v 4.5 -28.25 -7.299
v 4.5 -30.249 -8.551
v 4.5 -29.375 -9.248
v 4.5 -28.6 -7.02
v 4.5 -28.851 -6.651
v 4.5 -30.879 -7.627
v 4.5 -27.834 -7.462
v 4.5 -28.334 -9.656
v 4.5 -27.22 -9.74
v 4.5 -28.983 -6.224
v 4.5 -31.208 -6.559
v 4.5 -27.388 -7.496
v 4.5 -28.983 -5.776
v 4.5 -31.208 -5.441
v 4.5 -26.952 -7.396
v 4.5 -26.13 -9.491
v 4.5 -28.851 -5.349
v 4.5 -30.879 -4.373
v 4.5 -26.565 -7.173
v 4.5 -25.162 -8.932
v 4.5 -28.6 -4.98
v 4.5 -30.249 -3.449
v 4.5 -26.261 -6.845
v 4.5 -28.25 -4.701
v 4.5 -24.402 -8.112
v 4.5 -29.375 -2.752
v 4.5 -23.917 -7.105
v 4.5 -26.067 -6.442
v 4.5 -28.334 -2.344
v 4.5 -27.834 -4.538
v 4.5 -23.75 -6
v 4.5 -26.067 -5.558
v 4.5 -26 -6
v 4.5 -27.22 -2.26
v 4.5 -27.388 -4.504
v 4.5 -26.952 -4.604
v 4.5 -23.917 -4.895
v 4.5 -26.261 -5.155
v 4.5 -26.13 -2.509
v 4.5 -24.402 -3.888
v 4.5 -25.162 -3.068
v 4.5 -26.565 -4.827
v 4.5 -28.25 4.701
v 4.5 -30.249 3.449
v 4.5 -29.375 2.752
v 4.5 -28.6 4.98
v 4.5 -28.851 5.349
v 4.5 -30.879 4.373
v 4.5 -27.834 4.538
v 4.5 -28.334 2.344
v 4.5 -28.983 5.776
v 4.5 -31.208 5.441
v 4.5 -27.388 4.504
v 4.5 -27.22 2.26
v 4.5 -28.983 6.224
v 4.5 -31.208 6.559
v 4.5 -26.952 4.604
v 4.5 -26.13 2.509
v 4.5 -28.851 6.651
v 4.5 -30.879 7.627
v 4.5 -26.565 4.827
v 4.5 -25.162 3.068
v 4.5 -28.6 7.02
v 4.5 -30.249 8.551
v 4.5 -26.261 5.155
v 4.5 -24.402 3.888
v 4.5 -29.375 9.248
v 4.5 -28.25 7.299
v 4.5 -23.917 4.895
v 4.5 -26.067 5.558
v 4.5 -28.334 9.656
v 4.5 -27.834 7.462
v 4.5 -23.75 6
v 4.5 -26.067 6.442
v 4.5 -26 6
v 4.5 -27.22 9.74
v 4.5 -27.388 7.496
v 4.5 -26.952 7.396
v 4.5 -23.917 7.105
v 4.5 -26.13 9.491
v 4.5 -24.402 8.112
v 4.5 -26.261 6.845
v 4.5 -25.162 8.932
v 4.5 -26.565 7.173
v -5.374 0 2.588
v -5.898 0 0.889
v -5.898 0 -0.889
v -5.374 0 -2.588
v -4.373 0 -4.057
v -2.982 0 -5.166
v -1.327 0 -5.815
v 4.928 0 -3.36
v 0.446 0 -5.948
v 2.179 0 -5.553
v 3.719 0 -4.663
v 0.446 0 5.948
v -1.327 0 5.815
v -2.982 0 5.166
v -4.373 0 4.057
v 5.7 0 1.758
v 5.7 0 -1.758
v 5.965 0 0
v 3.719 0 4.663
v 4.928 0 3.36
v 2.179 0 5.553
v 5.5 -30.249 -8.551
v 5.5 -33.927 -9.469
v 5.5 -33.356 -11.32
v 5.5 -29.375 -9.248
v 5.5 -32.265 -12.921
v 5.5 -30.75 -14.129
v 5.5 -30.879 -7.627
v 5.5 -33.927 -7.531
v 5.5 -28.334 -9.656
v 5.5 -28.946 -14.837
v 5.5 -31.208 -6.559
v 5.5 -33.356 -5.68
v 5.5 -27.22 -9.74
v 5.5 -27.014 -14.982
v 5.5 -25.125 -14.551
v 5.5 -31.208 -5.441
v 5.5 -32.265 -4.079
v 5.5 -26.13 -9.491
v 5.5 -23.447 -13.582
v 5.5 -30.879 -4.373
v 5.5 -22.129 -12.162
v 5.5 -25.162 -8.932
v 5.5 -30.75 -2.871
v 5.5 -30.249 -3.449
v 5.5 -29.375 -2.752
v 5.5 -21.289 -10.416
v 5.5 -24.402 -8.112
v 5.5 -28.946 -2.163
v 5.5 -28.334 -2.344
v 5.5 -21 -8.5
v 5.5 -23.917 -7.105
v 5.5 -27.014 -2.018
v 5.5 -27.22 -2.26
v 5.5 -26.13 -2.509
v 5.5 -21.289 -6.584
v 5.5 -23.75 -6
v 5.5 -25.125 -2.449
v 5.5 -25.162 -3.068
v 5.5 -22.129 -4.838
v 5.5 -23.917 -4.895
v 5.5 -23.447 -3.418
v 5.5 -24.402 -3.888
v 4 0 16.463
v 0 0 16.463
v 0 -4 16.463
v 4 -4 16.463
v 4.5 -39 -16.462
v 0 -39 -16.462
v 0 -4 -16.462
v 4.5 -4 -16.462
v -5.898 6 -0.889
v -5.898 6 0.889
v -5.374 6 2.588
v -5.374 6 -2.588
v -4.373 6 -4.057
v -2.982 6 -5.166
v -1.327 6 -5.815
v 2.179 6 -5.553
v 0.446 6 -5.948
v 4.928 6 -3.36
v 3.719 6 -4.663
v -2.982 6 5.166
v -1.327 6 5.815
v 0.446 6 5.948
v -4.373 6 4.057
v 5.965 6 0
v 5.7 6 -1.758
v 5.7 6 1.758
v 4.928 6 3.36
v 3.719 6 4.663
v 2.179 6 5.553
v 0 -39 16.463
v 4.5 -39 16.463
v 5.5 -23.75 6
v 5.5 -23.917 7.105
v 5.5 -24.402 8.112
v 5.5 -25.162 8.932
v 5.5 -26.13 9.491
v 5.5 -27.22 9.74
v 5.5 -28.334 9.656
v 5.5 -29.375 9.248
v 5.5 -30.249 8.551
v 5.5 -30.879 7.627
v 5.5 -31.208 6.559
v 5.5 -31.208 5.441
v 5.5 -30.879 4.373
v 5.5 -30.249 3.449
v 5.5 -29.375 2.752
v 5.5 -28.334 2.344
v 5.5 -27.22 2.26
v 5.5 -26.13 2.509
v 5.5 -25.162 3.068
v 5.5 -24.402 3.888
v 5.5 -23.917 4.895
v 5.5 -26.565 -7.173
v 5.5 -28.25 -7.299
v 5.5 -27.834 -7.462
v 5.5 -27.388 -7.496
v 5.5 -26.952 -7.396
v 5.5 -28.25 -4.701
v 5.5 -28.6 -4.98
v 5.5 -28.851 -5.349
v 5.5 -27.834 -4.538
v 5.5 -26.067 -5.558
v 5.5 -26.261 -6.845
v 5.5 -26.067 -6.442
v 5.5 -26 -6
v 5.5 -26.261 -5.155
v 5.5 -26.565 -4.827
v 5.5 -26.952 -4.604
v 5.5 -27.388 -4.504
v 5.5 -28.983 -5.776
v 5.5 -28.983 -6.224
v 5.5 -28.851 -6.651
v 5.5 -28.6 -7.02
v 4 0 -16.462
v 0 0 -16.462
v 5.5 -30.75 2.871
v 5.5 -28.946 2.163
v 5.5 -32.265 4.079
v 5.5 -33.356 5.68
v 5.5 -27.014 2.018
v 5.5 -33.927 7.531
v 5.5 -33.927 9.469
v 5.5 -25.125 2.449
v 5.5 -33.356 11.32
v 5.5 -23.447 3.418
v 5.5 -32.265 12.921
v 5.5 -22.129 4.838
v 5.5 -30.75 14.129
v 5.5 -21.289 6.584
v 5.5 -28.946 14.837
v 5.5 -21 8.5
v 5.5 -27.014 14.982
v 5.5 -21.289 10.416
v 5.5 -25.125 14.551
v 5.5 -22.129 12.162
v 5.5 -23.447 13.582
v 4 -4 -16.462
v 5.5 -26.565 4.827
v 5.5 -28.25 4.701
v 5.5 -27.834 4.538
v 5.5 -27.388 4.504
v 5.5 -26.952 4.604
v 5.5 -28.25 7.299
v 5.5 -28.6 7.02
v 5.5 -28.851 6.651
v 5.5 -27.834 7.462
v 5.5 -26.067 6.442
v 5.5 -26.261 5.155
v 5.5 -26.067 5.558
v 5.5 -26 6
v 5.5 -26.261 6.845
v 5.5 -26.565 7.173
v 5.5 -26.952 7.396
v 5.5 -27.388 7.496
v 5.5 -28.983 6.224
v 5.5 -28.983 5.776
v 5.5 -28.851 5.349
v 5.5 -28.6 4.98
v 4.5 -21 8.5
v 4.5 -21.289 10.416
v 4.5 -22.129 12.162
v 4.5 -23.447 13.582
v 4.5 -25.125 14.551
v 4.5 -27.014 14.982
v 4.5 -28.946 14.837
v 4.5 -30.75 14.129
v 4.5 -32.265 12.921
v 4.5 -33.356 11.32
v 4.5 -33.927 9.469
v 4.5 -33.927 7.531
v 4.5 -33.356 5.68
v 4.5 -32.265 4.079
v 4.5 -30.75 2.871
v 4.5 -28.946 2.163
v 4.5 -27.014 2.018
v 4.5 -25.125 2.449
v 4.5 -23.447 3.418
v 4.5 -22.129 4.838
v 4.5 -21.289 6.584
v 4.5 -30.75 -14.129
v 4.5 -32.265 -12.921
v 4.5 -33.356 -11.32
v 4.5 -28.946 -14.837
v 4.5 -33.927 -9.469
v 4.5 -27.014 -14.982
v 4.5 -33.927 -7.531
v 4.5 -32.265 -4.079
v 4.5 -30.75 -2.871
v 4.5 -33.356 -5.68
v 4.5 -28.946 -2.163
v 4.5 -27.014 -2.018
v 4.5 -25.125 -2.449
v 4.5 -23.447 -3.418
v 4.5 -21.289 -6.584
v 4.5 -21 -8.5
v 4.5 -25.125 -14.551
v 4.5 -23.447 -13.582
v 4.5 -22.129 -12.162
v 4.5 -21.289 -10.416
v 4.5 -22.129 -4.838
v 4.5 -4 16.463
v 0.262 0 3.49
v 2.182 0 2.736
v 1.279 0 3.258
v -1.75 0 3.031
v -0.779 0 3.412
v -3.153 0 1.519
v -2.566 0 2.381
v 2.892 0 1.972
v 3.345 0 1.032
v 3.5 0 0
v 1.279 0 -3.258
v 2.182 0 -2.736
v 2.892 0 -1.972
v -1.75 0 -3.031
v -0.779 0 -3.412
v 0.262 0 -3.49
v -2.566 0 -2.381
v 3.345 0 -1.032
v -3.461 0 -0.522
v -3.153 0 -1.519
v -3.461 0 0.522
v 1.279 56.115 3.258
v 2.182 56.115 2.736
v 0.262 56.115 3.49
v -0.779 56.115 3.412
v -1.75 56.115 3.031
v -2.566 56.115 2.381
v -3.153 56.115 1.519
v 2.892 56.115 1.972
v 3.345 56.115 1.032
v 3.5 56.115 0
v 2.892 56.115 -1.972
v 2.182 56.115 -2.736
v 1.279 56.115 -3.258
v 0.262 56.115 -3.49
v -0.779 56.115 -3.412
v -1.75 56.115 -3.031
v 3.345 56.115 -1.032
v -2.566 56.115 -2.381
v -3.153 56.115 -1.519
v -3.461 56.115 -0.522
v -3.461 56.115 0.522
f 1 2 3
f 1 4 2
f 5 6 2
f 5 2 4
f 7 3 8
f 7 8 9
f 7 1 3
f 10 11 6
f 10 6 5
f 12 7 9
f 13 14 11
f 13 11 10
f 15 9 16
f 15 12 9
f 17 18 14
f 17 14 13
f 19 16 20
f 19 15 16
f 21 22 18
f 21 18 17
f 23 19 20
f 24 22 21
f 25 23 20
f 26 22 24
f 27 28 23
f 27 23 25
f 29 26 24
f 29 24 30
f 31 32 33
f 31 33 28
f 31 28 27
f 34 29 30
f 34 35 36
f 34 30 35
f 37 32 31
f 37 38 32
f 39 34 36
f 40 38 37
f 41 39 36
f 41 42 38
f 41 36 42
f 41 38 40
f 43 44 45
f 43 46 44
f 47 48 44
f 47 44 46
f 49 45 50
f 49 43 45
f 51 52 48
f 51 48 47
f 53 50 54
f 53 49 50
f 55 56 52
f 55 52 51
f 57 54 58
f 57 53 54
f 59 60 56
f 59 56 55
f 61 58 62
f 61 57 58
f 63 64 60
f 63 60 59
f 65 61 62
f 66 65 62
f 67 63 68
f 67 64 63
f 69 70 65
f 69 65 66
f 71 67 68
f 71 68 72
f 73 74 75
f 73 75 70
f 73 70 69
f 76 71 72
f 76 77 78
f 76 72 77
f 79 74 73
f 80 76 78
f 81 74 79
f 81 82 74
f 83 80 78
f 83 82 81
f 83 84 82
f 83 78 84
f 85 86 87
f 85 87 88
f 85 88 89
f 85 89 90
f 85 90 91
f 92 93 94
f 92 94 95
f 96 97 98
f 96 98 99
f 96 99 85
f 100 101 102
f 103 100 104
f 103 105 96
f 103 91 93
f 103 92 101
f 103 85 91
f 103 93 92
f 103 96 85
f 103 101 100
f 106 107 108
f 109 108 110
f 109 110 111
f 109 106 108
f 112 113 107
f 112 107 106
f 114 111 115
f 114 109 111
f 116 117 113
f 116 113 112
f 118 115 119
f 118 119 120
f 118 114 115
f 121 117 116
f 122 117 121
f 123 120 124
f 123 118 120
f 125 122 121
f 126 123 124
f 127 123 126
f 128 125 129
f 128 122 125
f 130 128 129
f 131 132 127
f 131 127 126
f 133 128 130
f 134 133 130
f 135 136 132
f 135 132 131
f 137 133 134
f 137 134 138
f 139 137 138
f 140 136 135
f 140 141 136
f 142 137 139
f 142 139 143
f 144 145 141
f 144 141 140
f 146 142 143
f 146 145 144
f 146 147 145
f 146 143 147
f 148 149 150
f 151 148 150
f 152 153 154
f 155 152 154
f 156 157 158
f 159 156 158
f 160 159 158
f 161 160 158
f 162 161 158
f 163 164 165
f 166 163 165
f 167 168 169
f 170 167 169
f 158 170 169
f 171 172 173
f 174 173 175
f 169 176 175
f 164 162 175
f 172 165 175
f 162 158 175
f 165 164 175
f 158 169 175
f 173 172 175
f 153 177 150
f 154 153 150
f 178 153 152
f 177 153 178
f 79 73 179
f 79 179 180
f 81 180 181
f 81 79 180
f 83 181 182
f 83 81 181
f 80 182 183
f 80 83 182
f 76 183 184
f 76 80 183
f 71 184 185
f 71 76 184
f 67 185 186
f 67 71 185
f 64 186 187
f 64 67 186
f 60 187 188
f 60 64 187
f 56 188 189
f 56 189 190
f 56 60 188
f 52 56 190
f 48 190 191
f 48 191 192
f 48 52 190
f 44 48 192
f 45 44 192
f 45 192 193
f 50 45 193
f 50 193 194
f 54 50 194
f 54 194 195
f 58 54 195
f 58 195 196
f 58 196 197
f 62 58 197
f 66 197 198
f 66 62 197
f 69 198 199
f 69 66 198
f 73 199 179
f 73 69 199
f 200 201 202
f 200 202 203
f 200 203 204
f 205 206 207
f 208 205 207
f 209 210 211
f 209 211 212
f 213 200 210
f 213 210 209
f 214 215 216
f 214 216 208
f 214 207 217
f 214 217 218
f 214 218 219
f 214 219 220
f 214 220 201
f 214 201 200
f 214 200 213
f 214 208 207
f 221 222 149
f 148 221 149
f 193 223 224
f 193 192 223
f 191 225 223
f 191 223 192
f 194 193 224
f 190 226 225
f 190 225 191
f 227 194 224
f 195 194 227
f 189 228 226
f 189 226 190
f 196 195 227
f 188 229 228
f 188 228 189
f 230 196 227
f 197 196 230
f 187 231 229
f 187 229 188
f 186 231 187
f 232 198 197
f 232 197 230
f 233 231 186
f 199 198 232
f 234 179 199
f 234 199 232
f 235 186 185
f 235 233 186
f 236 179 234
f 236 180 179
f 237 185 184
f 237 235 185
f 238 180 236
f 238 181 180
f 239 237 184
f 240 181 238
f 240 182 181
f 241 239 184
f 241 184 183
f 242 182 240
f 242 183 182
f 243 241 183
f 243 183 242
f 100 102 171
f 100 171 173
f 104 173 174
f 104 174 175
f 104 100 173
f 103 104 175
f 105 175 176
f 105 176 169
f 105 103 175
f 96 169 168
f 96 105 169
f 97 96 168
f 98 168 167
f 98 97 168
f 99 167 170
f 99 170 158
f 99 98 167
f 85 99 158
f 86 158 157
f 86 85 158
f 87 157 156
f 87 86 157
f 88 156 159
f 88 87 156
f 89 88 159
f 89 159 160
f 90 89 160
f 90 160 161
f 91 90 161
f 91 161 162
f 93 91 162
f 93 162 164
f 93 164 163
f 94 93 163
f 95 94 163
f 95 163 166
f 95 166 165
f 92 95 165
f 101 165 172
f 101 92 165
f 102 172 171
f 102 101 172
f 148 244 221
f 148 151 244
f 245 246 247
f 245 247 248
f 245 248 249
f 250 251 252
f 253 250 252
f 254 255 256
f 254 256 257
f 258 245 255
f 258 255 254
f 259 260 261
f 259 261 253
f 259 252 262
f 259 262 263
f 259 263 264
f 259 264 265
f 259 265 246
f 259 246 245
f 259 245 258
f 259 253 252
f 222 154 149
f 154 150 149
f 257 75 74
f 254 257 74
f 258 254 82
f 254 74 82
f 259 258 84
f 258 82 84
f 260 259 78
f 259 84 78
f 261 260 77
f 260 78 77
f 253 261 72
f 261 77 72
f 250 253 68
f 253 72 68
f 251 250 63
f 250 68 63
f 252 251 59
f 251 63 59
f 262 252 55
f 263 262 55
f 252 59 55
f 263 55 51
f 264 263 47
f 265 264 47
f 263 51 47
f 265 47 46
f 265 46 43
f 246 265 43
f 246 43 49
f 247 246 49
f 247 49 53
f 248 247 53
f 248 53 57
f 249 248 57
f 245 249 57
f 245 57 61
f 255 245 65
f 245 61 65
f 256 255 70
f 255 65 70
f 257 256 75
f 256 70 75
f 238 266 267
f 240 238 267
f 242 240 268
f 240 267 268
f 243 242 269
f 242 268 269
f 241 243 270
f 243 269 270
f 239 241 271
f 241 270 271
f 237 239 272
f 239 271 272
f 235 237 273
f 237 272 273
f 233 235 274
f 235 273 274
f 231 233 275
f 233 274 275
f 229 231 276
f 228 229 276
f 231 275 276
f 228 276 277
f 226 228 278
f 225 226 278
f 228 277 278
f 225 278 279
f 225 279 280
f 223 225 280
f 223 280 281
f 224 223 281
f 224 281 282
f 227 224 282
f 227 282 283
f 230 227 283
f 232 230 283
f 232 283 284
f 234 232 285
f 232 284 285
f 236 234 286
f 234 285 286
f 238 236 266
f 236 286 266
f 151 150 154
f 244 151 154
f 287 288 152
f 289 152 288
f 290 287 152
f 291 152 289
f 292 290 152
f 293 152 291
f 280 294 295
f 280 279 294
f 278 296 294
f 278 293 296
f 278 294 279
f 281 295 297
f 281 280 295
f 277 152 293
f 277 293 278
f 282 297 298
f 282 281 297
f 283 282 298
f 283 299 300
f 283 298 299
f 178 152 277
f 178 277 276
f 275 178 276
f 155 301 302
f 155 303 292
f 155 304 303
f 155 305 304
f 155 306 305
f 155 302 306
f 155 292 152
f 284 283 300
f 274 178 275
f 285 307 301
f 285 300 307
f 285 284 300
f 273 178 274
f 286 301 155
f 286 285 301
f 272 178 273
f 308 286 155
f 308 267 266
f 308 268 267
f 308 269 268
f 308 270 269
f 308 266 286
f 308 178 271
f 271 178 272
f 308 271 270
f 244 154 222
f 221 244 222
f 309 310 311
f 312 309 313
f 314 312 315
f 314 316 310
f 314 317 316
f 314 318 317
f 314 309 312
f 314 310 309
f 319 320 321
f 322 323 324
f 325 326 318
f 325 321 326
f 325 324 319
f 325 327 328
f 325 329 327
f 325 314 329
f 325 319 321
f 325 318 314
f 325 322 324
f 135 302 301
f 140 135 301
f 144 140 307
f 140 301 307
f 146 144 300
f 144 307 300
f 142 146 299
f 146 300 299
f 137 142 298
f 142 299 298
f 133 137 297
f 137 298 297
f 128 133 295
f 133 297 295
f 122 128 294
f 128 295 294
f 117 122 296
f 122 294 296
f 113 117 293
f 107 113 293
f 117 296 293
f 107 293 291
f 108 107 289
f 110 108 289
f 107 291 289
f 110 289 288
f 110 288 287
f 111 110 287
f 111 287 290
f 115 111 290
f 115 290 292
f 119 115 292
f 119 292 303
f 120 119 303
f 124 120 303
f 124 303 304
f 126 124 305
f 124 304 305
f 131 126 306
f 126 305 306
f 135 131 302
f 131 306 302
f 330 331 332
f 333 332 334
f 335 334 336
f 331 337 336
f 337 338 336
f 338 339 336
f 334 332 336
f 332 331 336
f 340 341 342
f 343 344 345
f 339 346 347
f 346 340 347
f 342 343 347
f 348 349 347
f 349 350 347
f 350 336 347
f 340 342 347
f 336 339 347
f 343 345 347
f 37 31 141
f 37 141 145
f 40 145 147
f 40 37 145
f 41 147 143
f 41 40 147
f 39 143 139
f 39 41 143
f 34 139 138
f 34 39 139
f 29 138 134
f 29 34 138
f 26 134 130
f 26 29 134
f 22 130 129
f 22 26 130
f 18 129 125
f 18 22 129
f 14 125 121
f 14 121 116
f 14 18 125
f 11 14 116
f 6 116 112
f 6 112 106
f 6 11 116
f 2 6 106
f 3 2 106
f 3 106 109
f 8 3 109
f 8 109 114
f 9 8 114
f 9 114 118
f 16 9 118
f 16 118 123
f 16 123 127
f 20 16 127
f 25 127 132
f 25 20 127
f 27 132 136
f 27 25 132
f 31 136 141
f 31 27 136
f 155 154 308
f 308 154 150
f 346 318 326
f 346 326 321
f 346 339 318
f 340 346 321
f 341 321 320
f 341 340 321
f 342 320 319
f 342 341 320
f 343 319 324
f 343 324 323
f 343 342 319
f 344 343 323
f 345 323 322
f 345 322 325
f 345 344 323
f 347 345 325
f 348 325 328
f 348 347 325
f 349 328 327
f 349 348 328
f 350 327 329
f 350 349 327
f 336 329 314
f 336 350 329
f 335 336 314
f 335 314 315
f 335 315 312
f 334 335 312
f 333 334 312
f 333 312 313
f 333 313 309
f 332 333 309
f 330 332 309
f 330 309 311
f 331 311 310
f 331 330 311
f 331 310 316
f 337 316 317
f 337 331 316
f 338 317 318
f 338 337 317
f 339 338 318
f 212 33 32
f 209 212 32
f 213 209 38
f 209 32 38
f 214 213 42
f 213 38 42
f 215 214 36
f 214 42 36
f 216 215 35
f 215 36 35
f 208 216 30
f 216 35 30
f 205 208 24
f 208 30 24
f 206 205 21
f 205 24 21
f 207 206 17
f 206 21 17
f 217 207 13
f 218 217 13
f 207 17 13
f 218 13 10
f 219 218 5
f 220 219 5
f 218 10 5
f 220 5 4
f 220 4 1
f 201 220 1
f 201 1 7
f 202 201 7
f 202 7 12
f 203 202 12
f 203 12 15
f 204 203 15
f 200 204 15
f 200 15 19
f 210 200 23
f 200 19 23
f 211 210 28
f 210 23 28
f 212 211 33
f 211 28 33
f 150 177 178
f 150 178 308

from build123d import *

# Parameters (mm, degrees)
F1_W      = 3.5
F1_H      = 56.115262
F3_R      = 5.964828
F4_DEPTH  = 6
F7_DEPTH  = 4
F6_W      = 35
F6_H      = 32.925087
F8_DEPTH  = 4.5
F9_R      = 6.5
F9_R_2    = 3.75
F10_DEPTH = 1
F9_R_3    = 1.5
F11_DEPTH = 1


with BuildPart() as f2:
    # F1 (on Top) → F2 (revolve)
    with BuildSketch(Plane.XY):
        with Locations((1.75, 28.057631)):
            Rectangle(F1_W, F1_H)
    revolve(axis=Axis((0, 28.057631, 0), (0, 1, 0)))


with BuildPart() as f4:
    # F3 (on Front) → F4 (new body)
    with BuildSketch(Plane.XZ):
        Circle(F3_R)
    extrude(amount=-F4_DEPTH)


with BuildPart() as f7:
    # F5 (on Right) → F7 (new body)
    with BuildSketch(Plane.YZ):
        Polygon((-4, -16.461764), (0, -16.461764), (0, -5.961764), (0, 0), (0, 5.963323), (0, 16.463323), (-4, 16.463323), align=None)
    extrude(amount=F7_DEPTH)


with BuildPart() as f8:
    # F6 (on Right) → F8 (new body)
    with BuildSketch(Plane.YZ):
        with Locations((-21.5, 0.00078)):
            Rectangle(F6_W, F6_H)
    extrude(amount=F8_DEPTH)

    # F9 (on face) → F10 (join)
    with BuildSketch(Plane.YZ.offset(4.5)):
        with Locations((-27.5, -8.5)):
            Circle(F9_R)
        with Locations((-27.5, -6)):
            Circle(F9_R_2, mode=Mode.SUBTRACT)
        with Locations((-27.5, 8.5)):
            Circle(F9_R)
        with Locations((-27.5, 6)):
            Circle(F9_R_2, mode=Mode.SUBTRACT)
    extrude(amount=F10_DEPTH)

    # F9 (on face) → F11 (join)
    with BuildSketch(Plane.YZ.offset(4.5)):
        with Locations((-27.5, -6)):
            Circle(F9_R_3)
        with Locations((-27.5, 6)):
            Circle(F9_R_3)
    extrude(amount=F11_DEPTH)


solid = Compound([f2.part, f4.part, f7.part, f8.part])
